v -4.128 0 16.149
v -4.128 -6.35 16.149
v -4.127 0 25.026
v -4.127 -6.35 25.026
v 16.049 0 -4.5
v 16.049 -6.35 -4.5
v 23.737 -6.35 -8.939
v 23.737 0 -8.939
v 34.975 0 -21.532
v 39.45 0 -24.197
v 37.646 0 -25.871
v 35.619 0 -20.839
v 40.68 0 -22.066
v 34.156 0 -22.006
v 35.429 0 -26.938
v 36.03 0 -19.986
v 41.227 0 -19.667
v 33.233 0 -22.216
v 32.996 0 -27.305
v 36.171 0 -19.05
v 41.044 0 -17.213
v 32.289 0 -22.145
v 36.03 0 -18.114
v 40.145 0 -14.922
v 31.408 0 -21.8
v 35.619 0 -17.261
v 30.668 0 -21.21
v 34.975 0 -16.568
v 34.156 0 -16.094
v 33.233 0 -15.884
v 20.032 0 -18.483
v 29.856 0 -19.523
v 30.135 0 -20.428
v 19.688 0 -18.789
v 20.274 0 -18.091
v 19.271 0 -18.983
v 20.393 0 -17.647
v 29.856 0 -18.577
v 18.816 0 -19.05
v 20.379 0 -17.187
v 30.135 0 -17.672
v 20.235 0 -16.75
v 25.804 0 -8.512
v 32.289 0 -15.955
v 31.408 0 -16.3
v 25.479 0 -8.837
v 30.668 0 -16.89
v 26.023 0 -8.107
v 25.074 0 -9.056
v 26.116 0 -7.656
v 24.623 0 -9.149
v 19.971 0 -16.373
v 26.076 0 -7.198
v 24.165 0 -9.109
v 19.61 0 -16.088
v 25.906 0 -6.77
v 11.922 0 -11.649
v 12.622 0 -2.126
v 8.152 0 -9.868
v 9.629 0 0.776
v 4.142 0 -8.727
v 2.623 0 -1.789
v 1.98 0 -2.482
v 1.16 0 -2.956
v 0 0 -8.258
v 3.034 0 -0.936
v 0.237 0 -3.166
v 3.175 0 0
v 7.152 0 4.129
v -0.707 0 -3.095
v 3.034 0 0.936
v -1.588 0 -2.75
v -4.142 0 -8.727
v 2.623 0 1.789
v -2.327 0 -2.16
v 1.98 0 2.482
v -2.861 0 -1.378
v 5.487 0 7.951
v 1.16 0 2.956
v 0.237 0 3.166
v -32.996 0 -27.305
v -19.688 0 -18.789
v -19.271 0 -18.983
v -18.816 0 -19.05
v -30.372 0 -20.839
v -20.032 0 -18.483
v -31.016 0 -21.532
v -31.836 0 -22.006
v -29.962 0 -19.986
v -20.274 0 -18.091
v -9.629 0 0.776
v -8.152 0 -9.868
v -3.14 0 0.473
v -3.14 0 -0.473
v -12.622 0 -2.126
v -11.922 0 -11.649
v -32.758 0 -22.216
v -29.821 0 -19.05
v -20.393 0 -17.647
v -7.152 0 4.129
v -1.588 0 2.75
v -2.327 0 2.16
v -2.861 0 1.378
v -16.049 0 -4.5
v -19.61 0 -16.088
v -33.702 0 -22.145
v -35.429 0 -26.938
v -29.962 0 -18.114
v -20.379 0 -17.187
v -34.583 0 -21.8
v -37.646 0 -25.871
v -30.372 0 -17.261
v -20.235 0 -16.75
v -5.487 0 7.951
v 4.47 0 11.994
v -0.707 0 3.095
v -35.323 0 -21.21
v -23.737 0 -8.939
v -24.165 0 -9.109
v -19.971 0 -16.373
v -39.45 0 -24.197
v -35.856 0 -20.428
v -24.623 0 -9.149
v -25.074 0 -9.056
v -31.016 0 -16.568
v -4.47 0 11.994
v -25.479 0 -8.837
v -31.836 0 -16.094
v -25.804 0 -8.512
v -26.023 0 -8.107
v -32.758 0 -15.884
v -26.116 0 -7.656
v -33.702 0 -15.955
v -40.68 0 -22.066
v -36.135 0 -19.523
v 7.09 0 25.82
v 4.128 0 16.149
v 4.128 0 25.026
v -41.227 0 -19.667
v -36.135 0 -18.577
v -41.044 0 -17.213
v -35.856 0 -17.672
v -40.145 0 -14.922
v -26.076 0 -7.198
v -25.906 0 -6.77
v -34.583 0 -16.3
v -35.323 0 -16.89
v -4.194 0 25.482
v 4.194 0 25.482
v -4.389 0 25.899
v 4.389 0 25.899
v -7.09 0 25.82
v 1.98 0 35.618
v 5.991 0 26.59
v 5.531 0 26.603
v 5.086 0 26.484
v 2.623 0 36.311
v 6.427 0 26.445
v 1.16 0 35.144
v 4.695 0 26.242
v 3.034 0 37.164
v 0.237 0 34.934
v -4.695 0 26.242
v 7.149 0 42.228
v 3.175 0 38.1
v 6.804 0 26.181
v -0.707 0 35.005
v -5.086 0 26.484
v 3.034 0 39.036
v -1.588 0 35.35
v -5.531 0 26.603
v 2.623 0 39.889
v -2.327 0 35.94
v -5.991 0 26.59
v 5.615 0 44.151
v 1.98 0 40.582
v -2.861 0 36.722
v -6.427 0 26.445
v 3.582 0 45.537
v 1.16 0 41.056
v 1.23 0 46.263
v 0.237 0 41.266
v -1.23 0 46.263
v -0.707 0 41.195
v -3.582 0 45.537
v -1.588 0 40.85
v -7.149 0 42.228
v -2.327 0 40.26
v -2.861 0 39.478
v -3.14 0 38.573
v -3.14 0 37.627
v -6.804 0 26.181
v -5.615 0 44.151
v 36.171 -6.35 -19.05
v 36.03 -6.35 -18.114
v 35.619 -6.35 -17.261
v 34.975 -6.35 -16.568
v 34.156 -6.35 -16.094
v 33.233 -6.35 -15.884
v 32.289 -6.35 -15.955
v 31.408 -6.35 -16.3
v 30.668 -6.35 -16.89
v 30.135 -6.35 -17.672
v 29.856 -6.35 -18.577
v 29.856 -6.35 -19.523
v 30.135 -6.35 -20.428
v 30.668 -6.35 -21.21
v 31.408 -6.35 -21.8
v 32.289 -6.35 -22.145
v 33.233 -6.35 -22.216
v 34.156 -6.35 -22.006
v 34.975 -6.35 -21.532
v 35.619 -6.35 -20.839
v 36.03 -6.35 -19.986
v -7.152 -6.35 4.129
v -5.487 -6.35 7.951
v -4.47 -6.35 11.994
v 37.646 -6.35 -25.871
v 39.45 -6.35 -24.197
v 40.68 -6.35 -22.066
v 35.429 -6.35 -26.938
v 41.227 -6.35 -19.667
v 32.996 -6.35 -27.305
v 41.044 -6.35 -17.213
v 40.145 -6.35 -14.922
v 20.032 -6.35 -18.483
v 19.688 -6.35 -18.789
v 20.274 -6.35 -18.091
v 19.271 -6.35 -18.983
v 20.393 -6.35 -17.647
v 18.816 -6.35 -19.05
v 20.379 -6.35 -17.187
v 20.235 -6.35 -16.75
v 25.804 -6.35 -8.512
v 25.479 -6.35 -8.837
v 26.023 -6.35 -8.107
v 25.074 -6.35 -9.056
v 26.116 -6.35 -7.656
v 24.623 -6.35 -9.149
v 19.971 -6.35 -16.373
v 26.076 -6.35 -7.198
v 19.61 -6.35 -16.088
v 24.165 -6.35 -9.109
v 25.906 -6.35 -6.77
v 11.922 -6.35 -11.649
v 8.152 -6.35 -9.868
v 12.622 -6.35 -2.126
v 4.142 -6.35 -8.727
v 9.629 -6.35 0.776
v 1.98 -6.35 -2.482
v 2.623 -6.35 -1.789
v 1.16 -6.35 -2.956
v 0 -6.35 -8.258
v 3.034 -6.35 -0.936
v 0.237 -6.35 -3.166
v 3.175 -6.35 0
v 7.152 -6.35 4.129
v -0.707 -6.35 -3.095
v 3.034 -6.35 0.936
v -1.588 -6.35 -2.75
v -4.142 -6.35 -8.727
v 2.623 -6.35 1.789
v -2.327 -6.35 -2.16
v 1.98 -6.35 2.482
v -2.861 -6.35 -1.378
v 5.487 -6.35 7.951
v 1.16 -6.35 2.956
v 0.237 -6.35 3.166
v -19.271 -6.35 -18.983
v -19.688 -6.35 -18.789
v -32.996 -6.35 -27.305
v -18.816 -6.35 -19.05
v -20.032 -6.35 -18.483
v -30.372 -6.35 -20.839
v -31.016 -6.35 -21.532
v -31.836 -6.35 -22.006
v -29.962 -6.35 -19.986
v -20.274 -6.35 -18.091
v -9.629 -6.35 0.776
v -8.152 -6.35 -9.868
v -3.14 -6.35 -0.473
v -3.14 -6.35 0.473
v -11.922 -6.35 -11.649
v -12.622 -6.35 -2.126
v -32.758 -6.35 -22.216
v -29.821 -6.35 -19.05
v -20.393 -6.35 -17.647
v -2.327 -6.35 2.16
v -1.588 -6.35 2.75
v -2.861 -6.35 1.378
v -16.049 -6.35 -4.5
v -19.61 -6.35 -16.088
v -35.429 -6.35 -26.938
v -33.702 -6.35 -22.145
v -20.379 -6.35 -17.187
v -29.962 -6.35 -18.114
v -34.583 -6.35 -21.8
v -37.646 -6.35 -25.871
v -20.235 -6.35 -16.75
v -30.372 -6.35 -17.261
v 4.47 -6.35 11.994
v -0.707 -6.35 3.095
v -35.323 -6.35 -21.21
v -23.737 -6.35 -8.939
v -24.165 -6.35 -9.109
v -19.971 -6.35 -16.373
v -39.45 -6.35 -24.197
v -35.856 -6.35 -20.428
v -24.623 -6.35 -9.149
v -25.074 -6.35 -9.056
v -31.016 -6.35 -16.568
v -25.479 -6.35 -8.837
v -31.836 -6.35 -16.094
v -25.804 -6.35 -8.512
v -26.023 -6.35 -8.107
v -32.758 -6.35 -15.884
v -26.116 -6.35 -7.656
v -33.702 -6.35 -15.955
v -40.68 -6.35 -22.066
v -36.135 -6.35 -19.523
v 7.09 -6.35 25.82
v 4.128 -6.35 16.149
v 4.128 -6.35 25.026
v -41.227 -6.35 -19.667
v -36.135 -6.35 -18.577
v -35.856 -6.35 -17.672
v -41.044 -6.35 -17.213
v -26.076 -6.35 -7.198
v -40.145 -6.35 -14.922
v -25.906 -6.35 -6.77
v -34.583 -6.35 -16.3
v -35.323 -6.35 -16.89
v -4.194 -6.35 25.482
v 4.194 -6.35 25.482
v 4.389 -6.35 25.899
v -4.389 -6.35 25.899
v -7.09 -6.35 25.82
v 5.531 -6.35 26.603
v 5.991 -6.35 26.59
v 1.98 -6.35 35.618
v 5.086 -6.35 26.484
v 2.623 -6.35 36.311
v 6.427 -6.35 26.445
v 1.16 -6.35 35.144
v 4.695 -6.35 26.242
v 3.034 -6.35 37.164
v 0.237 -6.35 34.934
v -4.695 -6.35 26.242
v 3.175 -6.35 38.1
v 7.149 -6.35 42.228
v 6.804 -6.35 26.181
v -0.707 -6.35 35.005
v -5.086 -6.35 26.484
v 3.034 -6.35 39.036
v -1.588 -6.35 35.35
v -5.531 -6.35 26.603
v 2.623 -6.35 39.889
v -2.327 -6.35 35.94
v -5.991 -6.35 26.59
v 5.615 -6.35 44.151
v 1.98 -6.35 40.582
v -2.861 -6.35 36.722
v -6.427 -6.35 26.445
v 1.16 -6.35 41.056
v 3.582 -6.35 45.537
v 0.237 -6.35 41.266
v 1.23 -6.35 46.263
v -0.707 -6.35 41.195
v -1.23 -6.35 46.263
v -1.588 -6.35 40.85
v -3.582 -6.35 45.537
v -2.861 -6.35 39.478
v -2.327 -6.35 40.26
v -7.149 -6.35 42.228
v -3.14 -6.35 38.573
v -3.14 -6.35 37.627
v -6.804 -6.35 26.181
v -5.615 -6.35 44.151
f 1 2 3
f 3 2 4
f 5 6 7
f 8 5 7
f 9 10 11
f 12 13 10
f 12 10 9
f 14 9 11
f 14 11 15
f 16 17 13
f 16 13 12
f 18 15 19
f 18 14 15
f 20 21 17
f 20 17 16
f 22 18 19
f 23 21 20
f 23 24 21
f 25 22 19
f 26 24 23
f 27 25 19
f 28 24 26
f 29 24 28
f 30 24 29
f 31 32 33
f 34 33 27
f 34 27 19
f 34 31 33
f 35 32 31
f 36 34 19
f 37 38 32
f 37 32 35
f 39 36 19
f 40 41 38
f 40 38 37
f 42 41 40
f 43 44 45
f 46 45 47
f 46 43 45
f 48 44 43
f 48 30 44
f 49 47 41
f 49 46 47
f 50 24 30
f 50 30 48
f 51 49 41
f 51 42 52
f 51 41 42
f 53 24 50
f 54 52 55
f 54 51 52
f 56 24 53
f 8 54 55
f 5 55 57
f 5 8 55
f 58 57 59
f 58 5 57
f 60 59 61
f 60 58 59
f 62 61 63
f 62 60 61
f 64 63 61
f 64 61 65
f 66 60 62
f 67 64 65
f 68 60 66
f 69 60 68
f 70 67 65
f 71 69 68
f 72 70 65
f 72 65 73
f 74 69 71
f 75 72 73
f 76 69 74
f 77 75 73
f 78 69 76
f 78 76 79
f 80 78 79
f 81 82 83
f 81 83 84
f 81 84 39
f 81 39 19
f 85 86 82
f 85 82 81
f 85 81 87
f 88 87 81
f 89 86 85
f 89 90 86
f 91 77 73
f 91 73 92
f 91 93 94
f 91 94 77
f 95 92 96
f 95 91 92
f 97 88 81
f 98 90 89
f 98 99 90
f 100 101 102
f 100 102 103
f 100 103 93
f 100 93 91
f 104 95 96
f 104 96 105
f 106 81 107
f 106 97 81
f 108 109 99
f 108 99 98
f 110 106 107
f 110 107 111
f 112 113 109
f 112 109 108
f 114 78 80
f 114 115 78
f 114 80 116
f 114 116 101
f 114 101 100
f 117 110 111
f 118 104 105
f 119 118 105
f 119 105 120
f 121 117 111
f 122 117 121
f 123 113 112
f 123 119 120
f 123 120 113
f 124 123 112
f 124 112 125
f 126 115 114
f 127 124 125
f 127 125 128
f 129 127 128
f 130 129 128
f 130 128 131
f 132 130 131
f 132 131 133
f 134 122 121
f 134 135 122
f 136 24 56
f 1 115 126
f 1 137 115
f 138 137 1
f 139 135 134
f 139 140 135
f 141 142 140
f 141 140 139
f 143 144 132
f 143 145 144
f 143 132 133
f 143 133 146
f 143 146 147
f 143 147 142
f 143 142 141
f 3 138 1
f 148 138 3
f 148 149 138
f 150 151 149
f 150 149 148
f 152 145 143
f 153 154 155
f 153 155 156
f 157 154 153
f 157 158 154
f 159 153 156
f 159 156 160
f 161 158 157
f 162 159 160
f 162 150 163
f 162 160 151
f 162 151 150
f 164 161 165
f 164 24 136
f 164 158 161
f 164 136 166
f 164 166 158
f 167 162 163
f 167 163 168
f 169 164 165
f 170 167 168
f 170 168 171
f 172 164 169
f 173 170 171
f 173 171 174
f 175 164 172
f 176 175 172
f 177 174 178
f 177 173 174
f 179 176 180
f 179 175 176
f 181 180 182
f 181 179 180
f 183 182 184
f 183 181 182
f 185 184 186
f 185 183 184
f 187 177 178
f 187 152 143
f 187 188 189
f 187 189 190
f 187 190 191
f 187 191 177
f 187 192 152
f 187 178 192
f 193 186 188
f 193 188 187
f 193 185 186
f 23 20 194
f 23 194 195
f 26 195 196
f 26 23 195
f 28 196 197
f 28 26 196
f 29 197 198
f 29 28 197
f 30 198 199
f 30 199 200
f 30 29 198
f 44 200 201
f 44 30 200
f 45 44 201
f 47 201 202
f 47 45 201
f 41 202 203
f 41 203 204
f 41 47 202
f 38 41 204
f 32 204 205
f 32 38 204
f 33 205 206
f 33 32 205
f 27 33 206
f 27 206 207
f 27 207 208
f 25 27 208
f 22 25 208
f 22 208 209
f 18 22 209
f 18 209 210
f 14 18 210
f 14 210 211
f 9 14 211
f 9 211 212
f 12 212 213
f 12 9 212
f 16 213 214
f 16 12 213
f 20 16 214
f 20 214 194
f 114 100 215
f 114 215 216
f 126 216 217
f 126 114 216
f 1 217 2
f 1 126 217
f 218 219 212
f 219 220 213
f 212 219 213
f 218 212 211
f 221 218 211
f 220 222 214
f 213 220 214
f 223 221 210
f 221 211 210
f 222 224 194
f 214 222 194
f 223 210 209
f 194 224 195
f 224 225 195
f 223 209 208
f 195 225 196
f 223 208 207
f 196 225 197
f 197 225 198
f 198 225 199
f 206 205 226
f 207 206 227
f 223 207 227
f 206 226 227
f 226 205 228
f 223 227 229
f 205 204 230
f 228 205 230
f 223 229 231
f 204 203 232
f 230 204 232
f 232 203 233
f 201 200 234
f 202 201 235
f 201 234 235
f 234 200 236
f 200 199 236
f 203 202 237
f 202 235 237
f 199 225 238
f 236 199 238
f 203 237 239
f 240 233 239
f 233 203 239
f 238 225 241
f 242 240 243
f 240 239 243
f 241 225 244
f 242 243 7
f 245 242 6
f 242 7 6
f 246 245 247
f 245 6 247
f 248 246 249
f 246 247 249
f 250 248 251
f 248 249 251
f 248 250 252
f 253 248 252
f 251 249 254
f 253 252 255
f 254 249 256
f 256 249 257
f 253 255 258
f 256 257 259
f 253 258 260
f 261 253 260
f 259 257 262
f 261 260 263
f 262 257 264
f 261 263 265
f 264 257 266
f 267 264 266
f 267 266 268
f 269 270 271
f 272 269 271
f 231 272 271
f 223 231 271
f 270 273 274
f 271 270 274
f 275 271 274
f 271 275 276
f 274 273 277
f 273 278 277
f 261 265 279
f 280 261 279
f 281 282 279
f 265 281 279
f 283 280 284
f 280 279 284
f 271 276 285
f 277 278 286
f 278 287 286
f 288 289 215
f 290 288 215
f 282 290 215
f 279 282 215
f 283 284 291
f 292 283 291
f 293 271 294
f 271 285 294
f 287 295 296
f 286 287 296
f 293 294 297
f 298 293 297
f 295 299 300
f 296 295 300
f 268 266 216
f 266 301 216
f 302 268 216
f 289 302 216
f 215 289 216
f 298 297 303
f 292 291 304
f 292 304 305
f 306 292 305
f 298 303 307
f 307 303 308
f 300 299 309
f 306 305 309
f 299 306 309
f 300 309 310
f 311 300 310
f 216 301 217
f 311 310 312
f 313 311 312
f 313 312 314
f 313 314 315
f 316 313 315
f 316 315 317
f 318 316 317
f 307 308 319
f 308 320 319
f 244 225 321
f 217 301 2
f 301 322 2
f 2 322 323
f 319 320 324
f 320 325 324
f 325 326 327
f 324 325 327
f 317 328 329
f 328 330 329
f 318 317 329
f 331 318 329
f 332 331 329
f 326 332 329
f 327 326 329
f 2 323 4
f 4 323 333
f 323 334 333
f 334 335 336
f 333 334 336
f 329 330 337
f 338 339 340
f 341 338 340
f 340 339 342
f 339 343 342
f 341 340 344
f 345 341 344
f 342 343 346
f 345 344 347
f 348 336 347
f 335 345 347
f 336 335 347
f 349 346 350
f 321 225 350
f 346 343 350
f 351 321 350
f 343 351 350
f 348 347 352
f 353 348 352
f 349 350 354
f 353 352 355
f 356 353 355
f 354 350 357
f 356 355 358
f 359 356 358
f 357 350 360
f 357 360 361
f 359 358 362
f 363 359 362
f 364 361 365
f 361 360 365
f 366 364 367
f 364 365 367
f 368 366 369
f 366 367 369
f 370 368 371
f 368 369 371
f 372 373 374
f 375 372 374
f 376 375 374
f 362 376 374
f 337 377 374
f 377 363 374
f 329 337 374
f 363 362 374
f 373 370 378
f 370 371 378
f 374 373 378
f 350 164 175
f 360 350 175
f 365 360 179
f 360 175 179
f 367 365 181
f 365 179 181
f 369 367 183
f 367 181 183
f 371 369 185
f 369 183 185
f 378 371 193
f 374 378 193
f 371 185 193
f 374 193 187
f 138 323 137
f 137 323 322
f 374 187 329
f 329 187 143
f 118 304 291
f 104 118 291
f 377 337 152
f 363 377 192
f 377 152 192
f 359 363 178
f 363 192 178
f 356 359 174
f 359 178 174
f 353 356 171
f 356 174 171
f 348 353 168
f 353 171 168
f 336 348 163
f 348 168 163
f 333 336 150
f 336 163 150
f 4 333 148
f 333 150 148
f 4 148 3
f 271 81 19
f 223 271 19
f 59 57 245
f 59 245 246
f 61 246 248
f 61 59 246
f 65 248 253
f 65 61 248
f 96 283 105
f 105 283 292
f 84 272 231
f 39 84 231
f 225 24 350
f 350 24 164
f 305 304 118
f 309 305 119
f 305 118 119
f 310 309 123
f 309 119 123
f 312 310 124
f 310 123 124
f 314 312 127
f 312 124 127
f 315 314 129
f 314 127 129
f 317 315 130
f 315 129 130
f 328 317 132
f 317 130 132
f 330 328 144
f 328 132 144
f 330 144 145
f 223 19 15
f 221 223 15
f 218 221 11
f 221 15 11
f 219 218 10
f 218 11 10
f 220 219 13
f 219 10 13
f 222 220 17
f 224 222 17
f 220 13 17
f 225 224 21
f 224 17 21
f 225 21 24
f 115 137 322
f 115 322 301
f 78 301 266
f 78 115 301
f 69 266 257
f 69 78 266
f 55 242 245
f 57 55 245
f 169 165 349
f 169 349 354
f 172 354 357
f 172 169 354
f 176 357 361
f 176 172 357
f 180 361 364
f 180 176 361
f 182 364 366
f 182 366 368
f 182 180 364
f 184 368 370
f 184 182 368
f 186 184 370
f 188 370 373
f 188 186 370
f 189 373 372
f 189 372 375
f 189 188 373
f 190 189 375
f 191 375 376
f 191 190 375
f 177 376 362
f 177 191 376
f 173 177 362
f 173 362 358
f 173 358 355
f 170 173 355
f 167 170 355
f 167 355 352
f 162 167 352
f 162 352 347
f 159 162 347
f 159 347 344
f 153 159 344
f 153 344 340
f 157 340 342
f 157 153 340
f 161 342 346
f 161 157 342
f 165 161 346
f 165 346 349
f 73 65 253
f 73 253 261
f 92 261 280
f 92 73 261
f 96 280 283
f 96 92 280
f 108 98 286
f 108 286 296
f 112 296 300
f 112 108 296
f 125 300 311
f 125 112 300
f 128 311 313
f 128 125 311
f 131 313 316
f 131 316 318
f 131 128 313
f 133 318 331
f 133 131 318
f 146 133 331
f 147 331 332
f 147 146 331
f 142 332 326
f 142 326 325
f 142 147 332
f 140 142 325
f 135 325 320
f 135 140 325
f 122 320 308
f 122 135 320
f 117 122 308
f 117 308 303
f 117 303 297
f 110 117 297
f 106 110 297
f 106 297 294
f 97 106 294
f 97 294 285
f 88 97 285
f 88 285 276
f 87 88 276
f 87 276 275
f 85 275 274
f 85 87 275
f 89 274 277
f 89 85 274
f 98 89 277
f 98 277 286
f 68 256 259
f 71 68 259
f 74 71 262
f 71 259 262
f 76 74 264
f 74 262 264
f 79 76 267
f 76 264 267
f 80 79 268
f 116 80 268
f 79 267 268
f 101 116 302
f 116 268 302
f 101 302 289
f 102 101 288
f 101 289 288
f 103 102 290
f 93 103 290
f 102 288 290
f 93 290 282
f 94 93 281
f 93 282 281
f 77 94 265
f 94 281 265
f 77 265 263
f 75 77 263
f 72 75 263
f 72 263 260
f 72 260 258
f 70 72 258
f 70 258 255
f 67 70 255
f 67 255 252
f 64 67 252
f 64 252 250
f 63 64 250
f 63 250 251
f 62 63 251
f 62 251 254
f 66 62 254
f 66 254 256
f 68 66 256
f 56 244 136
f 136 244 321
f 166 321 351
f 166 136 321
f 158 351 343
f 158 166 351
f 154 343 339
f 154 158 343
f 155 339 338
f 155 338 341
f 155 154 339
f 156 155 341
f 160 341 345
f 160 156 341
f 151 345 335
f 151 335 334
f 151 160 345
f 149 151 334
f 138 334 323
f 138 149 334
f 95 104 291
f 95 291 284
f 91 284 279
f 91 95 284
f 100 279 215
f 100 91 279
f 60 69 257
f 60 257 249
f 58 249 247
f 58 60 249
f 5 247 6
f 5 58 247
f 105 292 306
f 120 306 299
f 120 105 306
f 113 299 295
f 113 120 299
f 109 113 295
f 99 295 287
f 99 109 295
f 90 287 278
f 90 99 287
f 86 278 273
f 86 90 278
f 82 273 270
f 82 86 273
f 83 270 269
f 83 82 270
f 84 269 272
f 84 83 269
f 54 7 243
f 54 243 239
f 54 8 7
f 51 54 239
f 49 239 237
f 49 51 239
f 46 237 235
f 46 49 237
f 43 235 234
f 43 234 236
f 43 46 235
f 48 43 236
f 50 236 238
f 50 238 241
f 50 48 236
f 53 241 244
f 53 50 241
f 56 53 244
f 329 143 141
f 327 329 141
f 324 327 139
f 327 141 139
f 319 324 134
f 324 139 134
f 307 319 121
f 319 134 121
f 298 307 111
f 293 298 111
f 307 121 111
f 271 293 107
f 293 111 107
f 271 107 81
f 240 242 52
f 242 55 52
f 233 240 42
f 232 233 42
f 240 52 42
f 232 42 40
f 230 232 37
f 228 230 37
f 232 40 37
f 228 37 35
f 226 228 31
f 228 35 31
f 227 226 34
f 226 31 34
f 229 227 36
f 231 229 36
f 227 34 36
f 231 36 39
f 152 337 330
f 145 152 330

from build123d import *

# Parameters (mm, degrees)
F0_R        = 3.175
F1_DEPTH    = 6.35
F2_R        = 3.175
F3_DEPTH    = 6.351
F5_DEPTH    = 6.351
F6_T1_DEPTH = 6.35
F7_R        = 1.5875


# Not quite as in the source:
# - a fillet or chamfer that OpenCascade refuses, or shapes differently, is made with other operations: its cross-section is extruded or revolved along the edge and cut away or added


with BuildPart() as f1:
    # F0 (on Front) → F1 (new body)
    with BuildSketch(Plane.XZ):
        with BuildLine():
            ThreePointArc((32.9955678842, -27.305), (40.1446075924, -23.1775), (40.1446075924, -14.9225))
            Line((40.1446075924, -14.9225), (7.1490397082, 42.2275))
            ThreePointArc((7.1490397082, 42.2275), (0, 46.355), (-7.1490397082, 42.2275))
            Line((-7.1490397082, 42.2275), (-40.1446075924, -14.9225))
            ThreePointArc((-40.1446075924, -14.9225), (-40.1446075924, -23.1775), (-32.9955678842, -27.305))
            Line((-32.9955678842, -27.305), (32.9955678842, -27.305))
        make_face()
        with Locations((-32.9955678842, -19.05)):
            Circle(F0_R, mode=Mode.SUBTRACT)
        with Locations((32.9955678842, -19.05)):
            Circle(F0_R, mode=Mode.SUBTRACT)
        with Locations((0, 38.1)):
            Circle(F0_R, mode=Mode.SUBTRACT)
    extrude(amount=F1_DEPTH)

    # F2 (on face) → F3 (cut, through all)
    with BuildSketch(Plane.XZ.offset(6.35)):
        Circle(F2_R)
    extrude(amount=-F3_DEPTH, mode=Mode.SUBTRACT)

    # F4 (on face) → F5 (cut, through all)
    with BuildSketch(Plane.XZ.offset(6.35)):
        with BuildLine():
            ThreePointArc((-8.255, 0), (-7.1490397082, 4.1275), (-4.1275, 7.1490397082))
            Line((-4.1275, 7.1490397082), (-4.1275, 30.9509602918))
            Line((-4.1275, 30.9509602918), (-28.8680678842, -11.9009602918))
            Line((-28.8680678842, -11.9009602918), (-8.255, 0))
        make_face()
        with BuildLine():
            Line((24.7405678842, -19.05), (4.1275, -7.1490397082))
            ThreePointArc((4.1275, -7.1490397082), (0, -8.255), (-4.1275, -7.1490397082))
            Line((-4.1275, -7.1490397082), (-24.7405678842, -19.05))
            Line((-24.7405678842, -19.05), (24.7405678842, -19.05))
        make_face()
        with BuildLine():
            ThreePointArc((4.1275, 7.1490397082), (7.1490397082, 4.1275), (8.255, 0))
            Line((8.255, 0), (28.8680678842, -11.9009602918))
            Line((28.8680678842, -11.9009602918), (4.1275, 30.9509602918))
            Line((4.1275, 30.9509602918), (4.1275, 7.1490397082))
        make_face()
    extrude(amount=-F5_DEPTH, mode=Mode.SUBTRACT)

    # F6: fillet of radius 25.4 on 6 edges, made by hand

    # F6_s2 → F6_t1 (join)
    with BuildSketch(Plane.XZ):
        with BuildLine():
            ThreePointArc((-7.2425943396, 3.9610418114), (-4.9185930375, 9.8590537015), (-4.1275, 16.1488627696))
            Line((-4.1275, 16.1488627696), (-4.1275, 7.1490397082))
            ThreePointArc((-4.1275, 7.1490397082), (-5.9042860678, 5.7692660737), (-7.2425943396, 3.9610418114))
        make_face()
        with BuildLine():
            ThreePointArc((-16.0490754007, -4.4999115307), (-10.9974874815, -0.6699003293), (-7.0516600039, 4.2917497817))
            ThreePointArc((-7.0516600039, 4.2917497817), (-7.9484740149, 2.2286286891), (-8.255, 0))
            Line((-8.255, 0), (-16.0490754007, -4.4999115307))
        make_face()
        with BuildLine():
            ThreePointArc((0.1909343357, -8.2527915931), (-6.078894444, -9.1891533721), (-11.9215754007, -11.6489512389))
            Line((-11.9215754007, -11.6489512389), (-4.1275, -7.1490397082))
            ThreePointArc((-4.1275, -7.1490397082), (-2.0441879471, -7.9978947628), (0.1909343357, -8.2527915931))
        make_face()
        with BuildLine():
            ThreePointArc((11.9215754007, -11.6489512389), (6.078894444, -9.1891533721), (-0.1909343357, -8.2527915931))
            ThreePointArc((-0.1909343357, -8.2527915931), (2.0441879471, -7.9978947628), (4.1275, -7.1490397082))
            Line((4.1275, -7.1490397082), (11.9215754007, -11.6489512389))
        make_face()
        with BuildLine():
            ThreePointArc((7.0516600039, 4.2917497817), (10.9974874815, -0.6699003293), (16.0490754007, -4.4999115307))
            Line((16.0490754007, -4.4999115307), (8.255, 0))
            ThreePointArc((8.255, 0), (7.9484740149, 2.2286286891), (7.0516600039, 4.2917497817))
        make_face()
        with BuildLine():
            ThreePointArc((4.1275, 16.1488627696), (4.9185930375, 9.8590537015), (7.2425943396, 3.9610418114))
            ThreePointArc((7.2425943396, 3.9610418114), (5.9042860678, 5.7692660737), (4.1275, 7.1490397082))
            Line((4.1275, 7.1490397082), (4.1275, 16.1488627696))
        make_face()
    extrude(amount=F6_T1_DEPTH)

    # F7
    f7_edges = [f1.edges().sort_by_distance(p)[0] for p in [
        (4.1275, -3.175, 30.95096),
        (-4.1275, -3.175, 30.95096),
        (-28.868068, -3.175, -11.90096),
        (28.868068, -3.175, -11.90096),
        (24.740568, -3.175, -19.05),
        (-24.740568, -3.175, -19.05),
    ]]
    fillet(f7_edges, radius=F7_R)


solid = f1.part
